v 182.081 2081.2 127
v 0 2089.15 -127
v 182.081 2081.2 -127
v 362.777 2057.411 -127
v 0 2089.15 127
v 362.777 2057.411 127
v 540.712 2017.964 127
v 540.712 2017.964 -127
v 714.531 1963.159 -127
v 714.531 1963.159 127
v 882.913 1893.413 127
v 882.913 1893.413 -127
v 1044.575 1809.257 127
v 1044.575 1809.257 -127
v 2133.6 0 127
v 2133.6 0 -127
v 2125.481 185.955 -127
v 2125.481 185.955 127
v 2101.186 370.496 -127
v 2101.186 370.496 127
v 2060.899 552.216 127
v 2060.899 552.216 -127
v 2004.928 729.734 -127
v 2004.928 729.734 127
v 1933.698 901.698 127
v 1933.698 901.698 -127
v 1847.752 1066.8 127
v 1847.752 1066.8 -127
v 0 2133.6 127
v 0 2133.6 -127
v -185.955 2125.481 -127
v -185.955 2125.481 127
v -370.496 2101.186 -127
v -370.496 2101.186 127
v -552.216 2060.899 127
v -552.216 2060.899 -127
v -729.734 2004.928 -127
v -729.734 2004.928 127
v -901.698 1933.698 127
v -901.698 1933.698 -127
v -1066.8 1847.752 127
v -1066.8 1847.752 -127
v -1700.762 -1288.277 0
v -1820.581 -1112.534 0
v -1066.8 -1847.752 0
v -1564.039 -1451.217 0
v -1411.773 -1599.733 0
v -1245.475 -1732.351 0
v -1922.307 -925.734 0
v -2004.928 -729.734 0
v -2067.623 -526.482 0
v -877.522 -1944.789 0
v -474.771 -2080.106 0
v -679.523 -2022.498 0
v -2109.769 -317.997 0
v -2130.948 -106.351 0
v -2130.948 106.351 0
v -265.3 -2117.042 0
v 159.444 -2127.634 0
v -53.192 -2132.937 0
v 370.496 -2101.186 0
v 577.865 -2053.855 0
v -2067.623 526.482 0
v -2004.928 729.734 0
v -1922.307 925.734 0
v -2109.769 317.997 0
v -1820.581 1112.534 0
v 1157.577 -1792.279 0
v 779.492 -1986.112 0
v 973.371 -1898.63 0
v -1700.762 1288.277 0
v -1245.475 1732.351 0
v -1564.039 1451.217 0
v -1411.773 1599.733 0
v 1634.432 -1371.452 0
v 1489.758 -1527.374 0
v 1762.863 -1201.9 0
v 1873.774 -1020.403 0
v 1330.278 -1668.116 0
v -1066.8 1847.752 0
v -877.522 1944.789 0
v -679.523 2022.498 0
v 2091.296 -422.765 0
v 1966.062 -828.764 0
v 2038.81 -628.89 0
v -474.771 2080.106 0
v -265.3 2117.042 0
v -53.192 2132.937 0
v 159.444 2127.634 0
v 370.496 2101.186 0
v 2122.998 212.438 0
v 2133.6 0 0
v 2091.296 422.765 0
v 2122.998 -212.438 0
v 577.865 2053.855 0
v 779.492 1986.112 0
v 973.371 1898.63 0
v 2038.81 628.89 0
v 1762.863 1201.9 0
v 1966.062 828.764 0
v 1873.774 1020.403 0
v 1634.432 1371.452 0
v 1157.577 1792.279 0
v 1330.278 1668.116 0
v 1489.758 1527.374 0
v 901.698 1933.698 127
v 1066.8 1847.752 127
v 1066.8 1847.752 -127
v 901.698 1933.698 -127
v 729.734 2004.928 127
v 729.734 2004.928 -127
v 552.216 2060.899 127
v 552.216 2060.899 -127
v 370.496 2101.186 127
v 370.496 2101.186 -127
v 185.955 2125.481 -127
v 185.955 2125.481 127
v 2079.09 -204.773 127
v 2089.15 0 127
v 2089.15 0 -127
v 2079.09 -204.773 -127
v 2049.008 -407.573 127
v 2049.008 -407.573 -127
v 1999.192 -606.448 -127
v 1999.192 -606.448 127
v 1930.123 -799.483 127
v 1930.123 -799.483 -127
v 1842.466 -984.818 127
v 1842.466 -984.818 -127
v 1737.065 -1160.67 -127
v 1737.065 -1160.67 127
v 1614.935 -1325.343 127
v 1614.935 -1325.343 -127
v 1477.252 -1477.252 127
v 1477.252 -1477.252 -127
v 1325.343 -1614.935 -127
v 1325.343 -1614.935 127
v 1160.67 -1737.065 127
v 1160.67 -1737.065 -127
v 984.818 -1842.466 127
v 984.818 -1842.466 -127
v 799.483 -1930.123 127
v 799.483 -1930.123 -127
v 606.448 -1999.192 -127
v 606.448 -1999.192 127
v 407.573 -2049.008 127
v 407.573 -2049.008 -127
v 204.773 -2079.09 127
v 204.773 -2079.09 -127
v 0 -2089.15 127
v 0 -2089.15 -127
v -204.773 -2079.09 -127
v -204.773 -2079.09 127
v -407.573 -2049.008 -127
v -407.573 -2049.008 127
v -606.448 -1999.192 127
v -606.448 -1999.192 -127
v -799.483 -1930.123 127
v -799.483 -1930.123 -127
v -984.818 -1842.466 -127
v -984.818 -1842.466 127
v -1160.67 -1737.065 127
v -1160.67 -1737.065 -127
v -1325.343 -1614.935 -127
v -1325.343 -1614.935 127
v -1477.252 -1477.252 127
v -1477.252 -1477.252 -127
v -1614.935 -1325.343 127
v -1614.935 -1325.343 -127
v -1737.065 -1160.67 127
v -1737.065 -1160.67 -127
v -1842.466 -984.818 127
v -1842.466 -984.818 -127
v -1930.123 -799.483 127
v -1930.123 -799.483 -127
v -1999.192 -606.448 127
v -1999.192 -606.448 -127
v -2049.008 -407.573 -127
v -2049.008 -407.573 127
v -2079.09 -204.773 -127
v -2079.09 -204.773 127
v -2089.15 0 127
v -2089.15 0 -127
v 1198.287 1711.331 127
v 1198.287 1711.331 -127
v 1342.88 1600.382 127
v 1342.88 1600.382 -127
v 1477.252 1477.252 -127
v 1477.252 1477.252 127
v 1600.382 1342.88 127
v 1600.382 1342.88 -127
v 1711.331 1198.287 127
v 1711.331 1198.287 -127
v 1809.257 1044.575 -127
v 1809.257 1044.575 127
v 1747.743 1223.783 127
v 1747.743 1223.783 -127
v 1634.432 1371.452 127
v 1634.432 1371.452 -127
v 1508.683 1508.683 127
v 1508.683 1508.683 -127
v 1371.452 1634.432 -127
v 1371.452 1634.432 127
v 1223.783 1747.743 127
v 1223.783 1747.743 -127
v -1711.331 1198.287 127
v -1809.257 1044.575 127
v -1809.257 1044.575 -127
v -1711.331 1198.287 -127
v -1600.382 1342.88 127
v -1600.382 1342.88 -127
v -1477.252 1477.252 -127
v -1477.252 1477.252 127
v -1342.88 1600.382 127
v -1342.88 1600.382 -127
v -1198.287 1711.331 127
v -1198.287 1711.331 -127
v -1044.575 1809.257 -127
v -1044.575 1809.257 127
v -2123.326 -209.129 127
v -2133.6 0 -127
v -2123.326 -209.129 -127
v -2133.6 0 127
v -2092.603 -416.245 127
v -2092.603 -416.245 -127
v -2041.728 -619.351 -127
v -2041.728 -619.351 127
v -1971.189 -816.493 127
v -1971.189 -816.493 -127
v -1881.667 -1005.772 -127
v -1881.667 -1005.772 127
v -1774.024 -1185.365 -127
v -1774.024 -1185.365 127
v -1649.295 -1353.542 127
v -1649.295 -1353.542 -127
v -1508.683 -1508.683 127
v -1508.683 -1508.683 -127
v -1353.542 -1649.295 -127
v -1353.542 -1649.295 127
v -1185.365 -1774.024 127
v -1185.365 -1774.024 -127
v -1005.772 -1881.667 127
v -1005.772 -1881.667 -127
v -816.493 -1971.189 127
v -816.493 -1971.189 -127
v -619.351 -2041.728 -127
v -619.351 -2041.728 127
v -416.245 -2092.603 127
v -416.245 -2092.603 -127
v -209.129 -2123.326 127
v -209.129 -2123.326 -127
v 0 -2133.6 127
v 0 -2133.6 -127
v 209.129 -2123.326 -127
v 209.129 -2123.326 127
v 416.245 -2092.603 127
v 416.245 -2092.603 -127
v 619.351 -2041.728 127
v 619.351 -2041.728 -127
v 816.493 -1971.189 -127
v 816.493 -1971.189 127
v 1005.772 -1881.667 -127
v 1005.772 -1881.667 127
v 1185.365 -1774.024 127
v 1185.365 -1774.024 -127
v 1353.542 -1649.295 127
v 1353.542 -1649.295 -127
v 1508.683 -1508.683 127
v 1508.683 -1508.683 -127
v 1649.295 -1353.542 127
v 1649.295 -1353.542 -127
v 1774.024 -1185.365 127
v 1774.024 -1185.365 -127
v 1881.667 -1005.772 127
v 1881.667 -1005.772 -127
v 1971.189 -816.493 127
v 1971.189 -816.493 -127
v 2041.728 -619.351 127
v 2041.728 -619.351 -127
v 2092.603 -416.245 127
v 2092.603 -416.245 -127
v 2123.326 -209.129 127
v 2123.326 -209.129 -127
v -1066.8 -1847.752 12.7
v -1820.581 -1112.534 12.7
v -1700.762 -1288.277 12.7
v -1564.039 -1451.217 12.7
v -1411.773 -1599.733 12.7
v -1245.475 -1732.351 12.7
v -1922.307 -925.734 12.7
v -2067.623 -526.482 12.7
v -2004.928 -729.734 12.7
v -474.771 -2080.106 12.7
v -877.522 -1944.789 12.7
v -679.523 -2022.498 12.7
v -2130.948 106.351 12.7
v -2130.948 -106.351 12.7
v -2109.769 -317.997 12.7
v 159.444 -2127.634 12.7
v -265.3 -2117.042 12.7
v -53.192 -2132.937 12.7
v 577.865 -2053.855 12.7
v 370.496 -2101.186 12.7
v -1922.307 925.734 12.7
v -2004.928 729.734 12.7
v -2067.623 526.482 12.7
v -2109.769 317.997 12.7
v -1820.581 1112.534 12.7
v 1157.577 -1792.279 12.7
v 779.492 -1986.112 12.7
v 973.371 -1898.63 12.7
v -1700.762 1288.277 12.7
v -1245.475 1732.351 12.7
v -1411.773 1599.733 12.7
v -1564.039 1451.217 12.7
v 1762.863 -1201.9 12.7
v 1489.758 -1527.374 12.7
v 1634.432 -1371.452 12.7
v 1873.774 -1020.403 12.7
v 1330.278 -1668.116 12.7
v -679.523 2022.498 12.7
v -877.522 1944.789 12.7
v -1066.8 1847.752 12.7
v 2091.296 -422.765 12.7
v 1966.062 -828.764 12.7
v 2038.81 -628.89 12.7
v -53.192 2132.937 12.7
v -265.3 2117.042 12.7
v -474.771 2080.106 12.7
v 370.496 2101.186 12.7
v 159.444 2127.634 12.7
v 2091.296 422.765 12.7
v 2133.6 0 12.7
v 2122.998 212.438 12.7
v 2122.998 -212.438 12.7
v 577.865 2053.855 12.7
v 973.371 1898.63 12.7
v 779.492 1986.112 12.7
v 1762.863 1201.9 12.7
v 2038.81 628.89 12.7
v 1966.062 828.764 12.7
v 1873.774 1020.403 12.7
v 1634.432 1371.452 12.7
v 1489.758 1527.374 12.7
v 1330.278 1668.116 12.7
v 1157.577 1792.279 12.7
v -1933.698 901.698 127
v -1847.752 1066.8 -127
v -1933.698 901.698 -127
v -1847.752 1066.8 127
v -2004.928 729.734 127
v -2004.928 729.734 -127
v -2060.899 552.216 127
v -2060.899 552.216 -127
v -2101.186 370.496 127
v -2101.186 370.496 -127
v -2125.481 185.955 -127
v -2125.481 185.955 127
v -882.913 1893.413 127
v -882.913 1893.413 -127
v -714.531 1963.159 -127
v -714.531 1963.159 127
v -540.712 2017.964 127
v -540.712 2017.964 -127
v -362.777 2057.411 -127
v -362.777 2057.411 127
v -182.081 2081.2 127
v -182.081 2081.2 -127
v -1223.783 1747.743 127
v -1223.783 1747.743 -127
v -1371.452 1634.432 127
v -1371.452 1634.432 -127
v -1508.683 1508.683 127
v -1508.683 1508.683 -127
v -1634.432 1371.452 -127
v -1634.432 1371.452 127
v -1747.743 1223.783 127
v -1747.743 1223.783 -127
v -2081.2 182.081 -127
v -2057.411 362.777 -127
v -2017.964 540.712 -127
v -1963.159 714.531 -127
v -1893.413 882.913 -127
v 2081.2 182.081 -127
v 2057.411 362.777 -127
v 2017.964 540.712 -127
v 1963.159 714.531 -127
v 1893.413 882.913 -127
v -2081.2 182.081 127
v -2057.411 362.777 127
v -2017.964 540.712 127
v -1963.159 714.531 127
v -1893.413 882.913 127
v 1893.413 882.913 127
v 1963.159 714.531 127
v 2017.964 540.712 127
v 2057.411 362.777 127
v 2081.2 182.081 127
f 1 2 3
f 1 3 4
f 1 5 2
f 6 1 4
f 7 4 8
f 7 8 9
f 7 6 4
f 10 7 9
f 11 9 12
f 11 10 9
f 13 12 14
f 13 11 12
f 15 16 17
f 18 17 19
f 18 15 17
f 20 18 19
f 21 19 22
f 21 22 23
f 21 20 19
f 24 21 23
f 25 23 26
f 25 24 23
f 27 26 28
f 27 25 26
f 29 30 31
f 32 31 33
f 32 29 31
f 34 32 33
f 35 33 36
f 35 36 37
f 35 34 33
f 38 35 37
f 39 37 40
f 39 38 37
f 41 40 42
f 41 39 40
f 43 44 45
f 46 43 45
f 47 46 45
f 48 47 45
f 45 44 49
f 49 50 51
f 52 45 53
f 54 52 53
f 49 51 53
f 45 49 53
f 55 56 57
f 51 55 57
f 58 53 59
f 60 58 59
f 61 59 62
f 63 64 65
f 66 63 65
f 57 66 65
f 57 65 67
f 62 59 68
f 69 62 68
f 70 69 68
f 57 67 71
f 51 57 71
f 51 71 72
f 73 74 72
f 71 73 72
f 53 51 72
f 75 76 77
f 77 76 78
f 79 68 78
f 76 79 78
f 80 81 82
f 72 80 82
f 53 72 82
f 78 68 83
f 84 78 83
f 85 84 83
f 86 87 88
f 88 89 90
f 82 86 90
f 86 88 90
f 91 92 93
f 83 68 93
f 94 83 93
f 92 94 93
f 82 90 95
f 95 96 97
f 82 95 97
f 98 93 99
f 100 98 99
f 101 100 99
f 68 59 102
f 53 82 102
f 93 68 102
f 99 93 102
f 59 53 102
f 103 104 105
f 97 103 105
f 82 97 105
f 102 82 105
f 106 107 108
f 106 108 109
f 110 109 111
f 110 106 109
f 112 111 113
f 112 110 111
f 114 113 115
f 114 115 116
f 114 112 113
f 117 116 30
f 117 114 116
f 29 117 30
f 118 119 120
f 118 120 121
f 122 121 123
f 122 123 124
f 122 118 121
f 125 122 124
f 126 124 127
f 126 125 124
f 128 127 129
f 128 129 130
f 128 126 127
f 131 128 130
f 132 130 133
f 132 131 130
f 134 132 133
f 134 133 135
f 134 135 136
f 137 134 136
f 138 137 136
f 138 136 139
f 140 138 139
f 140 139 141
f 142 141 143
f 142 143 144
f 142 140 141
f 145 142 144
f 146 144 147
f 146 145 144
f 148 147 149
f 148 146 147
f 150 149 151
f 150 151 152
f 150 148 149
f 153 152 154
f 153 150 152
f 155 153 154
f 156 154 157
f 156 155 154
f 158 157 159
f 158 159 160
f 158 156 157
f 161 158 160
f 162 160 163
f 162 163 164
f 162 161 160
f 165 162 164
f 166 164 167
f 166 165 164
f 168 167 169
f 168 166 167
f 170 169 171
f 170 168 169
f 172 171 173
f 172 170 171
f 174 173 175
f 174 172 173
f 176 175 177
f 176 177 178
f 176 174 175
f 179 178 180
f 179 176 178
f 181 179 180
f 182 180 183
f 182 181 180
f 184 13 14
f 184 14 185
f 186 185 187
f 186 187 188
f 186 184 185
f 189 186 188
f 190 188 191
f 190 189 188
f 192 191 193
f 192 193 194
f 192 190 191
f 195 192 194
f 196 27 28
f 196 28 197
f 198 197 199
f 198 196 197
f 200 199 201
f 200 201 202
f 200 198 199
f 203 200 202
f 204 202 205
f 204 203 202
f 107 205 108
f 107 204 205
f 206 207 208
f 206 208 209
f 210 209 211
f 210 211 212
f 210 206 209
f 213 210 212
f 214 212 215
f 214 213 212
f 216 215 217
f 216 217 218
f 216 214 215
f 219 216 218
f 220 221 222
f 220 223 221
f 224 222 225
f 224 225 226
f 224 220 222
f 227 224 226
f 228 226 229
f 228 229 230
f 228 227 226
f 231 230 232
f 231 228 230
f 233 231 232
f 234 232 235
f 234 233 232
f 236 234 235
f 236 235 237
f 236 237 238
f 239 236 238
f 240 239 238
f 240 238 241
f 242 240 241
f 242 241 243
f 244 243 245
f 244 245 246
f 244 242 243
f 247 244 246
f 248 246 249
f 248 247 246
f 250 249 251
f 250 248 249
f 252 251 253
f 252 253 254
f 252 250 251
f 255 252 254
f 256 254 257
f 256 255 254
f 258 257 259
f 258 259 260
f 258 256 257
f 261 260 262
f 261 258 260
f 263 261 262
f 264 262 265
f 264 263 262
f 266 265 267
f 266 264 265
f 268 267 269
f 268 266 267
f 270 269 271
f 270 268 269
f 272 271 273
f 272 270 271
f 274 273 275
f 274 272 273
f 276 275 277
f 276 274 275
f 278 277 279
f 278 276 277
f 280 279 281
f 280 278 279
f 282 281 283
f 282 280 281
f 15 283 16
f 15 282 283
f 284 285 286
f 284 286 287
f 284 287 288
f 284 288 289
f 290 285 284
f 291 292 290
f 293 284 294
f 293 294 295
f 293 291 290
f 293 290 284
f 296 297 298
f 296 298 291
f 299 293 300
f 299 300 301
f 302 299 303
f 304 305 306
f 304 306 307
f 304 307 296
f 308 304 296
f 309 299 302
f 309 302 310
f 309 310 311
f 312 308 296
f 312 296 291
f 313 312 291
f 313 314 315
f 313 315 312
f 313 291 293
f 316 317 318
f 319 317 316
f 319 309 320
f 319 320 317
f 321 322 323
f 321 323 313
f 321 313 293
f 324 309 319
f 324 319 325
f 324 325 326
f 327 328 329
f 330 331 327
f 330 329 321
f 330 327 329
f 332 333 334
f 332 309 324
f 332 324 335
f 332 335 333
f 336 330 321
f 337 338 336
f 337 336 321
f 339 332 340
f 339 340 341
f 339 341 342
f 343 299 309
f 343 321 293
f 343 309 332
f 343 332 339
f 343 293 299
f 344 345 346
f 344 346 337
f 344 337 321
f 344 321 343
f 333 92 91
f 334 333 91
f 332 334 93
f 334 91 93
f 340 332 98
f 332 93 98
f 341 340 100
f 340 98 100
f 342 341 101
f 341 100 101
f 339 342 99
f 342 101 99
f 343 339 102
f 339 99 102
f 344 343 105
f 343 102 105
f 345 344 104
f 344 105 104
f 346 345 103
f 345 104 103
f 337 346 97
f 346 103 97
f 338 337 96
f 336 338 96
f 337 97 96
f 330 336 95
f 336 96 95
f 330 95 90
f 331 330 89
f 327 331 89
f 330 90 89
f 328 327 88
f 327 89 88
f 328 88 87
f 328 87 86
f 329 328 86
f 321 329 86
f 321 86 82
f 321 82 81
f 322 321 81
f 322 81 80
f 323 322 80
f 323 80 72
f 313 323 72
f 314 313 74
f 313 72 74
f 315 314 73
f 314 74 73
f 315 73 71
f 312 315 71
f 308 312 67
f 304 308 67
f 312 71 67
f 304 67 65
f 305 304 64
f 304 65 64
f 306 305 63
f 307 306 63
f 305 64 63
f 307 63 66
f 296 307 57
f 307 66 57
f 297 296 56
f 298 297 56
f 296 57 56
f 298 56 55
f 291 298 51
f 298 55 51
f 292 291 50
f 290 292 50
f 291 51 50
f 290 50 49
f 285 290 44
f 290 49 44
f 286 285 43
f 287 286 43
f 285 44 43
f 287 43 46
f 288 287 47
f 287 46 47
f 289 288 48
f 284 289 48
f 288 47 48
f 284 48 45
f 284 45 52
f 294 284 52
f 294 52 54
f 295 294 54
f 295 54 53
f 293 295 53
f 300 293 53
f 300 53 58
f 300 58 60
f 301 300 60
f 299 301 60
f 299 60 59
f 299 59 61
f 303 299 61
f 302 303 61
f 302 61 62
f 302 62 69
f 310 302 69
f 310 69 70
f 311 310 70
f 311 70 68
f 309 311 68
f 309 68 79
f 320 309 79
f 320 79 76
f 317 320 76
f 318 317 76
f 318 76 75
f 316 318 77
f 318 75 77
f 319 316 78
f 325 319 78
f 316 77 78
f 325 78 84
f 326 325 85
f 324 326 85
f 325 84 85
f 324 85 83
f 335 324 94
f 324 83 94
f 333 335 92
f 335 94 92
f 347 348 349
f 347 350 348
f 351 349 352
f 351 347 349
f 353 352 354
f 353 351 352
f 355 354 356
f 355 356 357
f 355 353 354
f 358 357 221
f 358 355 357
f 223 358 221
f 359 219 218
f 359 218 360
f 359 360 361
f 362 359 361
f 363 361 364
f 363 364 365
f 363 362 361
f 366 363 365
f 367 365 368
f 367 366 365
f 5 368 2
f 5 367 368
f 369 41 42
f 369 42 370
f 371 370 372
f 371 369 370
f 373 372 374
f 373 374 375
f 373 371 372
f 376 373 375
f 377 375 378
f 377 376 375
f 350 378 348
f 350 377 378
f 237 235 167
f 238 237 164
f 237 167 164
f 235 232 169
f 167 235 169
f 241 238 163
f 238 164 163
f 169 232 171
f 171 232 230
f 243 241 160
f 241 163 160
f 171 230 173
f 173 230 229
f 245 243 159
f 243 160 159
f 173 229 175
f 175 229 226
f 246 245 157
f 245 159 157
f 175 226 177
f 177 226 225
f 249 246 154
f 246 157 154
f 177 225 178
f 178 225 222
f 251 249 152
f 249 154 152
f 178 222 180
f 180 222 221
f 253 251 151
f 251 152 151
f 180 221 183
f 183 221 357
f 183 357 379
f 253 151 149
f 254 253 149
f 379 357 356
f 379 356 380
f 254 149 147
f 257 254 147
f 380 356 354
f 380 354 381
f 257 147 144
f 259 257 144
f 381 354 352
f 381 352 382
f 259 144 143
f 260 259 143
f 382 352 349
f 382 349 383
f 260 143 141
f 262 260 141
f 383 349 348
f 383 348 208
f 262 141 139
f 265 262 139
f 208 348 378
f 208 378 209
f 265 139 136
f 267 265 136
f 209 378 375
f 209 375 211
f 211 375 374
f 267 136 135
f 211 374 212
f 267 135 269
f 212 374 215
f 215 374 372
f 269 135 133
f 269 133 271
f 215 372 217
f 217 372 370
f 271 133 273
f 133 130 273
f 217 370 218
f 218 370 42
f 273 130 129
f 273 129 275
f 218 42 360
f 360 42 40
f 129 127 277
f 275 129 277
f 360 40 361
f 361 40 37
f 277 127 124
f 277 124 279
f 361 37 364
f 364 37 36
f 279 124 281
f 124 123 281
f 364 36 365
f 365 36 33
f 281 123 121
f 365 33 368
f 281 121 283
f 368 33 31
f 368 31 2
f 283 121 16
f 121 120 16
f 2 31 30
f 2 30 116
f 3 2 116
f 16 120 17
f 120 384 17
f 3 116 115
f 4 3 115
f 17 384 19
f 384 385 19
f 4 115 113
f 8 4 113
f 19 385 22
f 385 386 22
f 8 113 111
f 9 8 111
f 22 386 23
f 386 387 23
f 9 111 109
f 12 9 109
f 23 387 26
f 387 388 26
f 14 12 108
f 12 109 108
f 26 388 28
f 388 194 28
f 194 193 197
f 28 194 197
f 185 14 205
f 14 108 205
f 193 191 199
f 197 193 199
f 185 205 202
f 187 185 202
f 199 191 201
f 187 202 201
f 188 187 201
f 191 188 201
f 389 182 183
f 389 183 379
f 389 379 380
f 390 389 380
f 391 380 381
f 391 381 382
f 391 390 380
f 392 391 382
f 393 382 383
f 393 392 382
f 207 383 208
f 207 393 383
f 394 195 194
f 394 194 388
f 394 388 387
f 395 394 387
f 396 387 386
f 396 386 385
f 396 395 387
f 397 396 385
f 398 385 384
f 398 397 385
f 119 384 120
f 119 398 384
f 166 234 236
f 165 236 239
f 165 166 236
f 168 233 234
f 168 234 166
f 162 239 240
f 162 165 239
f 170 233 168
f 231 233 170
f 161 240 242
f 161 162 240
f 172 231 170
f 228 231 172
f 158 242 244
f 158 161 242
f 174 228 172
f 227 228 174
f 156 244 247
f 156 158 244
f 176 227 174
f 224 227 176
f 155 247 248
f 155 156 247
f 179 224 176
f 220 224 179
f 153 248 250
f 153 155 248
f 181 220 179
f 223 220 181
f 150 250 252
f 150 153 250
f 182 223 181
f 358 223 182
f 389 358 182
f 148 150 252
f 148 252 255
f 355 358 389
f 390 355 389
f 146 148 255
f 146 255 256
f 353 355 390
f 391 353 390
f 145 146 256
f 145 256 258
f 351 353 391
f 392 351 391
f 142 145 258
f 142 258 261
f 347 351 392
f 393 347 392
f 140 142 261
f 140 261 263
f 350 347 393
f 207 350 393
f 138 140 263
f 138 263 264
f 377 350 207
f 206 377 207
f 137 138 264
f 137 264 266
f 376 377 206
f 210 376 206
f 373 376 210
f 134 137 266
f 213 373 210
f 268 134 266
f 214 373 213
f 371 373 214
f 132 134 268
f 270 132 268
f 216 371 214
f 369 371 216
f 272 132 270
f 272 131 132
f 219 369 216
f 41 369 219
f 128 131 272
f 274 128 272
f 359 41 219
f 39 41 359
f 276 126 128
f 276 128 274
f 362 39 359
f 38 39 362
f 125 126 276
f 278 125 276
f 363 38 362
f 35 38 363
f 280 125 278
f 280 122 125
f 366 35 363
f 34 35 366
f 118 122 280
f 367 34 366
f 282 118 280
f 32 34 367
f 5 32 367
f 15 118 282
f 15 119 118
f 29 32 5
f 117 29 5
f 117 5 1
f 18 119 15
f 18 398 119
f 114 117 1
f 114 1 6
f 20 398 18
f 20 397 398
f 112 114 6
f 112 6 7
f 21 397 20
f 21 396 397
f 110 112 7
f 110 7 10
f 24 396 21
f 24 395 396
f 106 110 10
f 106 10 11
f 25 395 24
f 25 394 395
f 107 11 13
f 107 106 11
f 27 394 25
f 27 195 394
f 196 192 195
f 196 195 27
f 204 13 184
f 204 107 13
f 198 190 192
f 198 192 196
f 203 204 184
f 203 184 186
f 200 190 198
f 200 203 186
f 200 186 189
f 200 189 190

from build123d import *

# Parameters (mm, degrees)
F1_R     = 2133.6
F2_DEPTH = 12.7
F3_DEPTH = 127


with BuildPart() as f2:
    # F1 (on Top) → F2 (new body)
    with BuildSketch(Plane.XY):
        Circle(F1_R)
    extrude(amount=F2_DEPTH)


with BuildPart() as f3:
    # F0 (on Top) → F3 (new body, symmetric)
    with BuildSketch(Plane.XY):
        with BuildLine():
            Line((2089.15, 0), (2133.6, 0))
            ThreePointArc((2133.6, 0), (2060.899343, 552.216315), (1847.751802, 1066.8))
            Line((1847.751802, 1066.8), (1809.256972, 1044.575))
            ThreePointArc((1809.256972, 1044.575), (2017.96394, 540.711808), (2089.15, 0))
        make_face()
        with BuildLine():
            ThreePointArc((-2133.6, 0), (0, -2133.6), (2133.6, 0))
            Line((2133.6, 0), (2089.15, 0))
            ThreePointArc((2089.15, 0), (0, -2089.15), (-2089.15, 0))
            Line((-2089.15, 0), (-2133.6, 0))
        make_face()
        with BuildLine():
            Line((1809.256972, 1044.575), (1847.751802, 1066.8))
            ThreePointArc((1847.751802, 1066.8), (1508.683028, 1508.683028), (1066.8, 1847.751802))
            Line((1066.8, 1847.751802), (1044.575, 1809.256972))
            ThreePointArc((1044.575, 1809.256972), (1477.252132, 1477.252132), (1809.256972, 1044.575))
        make_face()
        with BuildLine():
            ThreePointArc((-1847.751802, 1066.8), (-2060.899343, 552.216315), (-2133.6, 0))
            Line((-2133.6, 0), (-2089.15, 0))
            ThreePointArc((-2089.15, 0), (-2017.96394, 540.711808), (-1809.256972, 1044.575))
            Line((-1809.256972, 1044.575), (-1847.751802, 1066.8))
        make_face()
        with BuildLine():
            Line((1044.575, 1809.256972), (1066.8, 1847.751802))
            ThreePointArc((1066.8, 1847.751802), (552.216315, 2060.899343), (0, 2133.6))
            Line((0, 2133.6), (0, 2089.15))
            ThreePointArc((0, 2089.15), (540.711808, 2017.96394), (1044.575, 1809.256972))
        make_face()
        with BuildLine():
            ThreePointArc((-1066.8, 1847.751802), (-1508.683028, 1508.683028), (-1847.751802, 1066.8))
            Line((-1847.751802, 1066.8), (-1809.256972, 1044.575))
            ThreePointArc((-1809.256972, 1044.575), (-1477.252132, 1477.252132), (-1044.575, 1809.256972))
            Line((-1044.575, 1809.256972), (-1066.8, 1847.751802))
        make_face()
        with BuildLine():
            Line((0, 2089.15), (0, 2133.6))
            ThreePointArc((0, 2133.6), (-552.216315, 2060.899343), (-1066.8, 1847.751802))
            Line((-1066.8, 1847.751802), (-1044.575, 1809.256972))
            ThreePointArc((-1044.575, 1809.256972), (-540.711808, 2017.96394), (0, 2089.15))
        make_face()
    extrude(amount=F3_DEPTH, both=True)


solid = Compound([f2.part, f3.part])
